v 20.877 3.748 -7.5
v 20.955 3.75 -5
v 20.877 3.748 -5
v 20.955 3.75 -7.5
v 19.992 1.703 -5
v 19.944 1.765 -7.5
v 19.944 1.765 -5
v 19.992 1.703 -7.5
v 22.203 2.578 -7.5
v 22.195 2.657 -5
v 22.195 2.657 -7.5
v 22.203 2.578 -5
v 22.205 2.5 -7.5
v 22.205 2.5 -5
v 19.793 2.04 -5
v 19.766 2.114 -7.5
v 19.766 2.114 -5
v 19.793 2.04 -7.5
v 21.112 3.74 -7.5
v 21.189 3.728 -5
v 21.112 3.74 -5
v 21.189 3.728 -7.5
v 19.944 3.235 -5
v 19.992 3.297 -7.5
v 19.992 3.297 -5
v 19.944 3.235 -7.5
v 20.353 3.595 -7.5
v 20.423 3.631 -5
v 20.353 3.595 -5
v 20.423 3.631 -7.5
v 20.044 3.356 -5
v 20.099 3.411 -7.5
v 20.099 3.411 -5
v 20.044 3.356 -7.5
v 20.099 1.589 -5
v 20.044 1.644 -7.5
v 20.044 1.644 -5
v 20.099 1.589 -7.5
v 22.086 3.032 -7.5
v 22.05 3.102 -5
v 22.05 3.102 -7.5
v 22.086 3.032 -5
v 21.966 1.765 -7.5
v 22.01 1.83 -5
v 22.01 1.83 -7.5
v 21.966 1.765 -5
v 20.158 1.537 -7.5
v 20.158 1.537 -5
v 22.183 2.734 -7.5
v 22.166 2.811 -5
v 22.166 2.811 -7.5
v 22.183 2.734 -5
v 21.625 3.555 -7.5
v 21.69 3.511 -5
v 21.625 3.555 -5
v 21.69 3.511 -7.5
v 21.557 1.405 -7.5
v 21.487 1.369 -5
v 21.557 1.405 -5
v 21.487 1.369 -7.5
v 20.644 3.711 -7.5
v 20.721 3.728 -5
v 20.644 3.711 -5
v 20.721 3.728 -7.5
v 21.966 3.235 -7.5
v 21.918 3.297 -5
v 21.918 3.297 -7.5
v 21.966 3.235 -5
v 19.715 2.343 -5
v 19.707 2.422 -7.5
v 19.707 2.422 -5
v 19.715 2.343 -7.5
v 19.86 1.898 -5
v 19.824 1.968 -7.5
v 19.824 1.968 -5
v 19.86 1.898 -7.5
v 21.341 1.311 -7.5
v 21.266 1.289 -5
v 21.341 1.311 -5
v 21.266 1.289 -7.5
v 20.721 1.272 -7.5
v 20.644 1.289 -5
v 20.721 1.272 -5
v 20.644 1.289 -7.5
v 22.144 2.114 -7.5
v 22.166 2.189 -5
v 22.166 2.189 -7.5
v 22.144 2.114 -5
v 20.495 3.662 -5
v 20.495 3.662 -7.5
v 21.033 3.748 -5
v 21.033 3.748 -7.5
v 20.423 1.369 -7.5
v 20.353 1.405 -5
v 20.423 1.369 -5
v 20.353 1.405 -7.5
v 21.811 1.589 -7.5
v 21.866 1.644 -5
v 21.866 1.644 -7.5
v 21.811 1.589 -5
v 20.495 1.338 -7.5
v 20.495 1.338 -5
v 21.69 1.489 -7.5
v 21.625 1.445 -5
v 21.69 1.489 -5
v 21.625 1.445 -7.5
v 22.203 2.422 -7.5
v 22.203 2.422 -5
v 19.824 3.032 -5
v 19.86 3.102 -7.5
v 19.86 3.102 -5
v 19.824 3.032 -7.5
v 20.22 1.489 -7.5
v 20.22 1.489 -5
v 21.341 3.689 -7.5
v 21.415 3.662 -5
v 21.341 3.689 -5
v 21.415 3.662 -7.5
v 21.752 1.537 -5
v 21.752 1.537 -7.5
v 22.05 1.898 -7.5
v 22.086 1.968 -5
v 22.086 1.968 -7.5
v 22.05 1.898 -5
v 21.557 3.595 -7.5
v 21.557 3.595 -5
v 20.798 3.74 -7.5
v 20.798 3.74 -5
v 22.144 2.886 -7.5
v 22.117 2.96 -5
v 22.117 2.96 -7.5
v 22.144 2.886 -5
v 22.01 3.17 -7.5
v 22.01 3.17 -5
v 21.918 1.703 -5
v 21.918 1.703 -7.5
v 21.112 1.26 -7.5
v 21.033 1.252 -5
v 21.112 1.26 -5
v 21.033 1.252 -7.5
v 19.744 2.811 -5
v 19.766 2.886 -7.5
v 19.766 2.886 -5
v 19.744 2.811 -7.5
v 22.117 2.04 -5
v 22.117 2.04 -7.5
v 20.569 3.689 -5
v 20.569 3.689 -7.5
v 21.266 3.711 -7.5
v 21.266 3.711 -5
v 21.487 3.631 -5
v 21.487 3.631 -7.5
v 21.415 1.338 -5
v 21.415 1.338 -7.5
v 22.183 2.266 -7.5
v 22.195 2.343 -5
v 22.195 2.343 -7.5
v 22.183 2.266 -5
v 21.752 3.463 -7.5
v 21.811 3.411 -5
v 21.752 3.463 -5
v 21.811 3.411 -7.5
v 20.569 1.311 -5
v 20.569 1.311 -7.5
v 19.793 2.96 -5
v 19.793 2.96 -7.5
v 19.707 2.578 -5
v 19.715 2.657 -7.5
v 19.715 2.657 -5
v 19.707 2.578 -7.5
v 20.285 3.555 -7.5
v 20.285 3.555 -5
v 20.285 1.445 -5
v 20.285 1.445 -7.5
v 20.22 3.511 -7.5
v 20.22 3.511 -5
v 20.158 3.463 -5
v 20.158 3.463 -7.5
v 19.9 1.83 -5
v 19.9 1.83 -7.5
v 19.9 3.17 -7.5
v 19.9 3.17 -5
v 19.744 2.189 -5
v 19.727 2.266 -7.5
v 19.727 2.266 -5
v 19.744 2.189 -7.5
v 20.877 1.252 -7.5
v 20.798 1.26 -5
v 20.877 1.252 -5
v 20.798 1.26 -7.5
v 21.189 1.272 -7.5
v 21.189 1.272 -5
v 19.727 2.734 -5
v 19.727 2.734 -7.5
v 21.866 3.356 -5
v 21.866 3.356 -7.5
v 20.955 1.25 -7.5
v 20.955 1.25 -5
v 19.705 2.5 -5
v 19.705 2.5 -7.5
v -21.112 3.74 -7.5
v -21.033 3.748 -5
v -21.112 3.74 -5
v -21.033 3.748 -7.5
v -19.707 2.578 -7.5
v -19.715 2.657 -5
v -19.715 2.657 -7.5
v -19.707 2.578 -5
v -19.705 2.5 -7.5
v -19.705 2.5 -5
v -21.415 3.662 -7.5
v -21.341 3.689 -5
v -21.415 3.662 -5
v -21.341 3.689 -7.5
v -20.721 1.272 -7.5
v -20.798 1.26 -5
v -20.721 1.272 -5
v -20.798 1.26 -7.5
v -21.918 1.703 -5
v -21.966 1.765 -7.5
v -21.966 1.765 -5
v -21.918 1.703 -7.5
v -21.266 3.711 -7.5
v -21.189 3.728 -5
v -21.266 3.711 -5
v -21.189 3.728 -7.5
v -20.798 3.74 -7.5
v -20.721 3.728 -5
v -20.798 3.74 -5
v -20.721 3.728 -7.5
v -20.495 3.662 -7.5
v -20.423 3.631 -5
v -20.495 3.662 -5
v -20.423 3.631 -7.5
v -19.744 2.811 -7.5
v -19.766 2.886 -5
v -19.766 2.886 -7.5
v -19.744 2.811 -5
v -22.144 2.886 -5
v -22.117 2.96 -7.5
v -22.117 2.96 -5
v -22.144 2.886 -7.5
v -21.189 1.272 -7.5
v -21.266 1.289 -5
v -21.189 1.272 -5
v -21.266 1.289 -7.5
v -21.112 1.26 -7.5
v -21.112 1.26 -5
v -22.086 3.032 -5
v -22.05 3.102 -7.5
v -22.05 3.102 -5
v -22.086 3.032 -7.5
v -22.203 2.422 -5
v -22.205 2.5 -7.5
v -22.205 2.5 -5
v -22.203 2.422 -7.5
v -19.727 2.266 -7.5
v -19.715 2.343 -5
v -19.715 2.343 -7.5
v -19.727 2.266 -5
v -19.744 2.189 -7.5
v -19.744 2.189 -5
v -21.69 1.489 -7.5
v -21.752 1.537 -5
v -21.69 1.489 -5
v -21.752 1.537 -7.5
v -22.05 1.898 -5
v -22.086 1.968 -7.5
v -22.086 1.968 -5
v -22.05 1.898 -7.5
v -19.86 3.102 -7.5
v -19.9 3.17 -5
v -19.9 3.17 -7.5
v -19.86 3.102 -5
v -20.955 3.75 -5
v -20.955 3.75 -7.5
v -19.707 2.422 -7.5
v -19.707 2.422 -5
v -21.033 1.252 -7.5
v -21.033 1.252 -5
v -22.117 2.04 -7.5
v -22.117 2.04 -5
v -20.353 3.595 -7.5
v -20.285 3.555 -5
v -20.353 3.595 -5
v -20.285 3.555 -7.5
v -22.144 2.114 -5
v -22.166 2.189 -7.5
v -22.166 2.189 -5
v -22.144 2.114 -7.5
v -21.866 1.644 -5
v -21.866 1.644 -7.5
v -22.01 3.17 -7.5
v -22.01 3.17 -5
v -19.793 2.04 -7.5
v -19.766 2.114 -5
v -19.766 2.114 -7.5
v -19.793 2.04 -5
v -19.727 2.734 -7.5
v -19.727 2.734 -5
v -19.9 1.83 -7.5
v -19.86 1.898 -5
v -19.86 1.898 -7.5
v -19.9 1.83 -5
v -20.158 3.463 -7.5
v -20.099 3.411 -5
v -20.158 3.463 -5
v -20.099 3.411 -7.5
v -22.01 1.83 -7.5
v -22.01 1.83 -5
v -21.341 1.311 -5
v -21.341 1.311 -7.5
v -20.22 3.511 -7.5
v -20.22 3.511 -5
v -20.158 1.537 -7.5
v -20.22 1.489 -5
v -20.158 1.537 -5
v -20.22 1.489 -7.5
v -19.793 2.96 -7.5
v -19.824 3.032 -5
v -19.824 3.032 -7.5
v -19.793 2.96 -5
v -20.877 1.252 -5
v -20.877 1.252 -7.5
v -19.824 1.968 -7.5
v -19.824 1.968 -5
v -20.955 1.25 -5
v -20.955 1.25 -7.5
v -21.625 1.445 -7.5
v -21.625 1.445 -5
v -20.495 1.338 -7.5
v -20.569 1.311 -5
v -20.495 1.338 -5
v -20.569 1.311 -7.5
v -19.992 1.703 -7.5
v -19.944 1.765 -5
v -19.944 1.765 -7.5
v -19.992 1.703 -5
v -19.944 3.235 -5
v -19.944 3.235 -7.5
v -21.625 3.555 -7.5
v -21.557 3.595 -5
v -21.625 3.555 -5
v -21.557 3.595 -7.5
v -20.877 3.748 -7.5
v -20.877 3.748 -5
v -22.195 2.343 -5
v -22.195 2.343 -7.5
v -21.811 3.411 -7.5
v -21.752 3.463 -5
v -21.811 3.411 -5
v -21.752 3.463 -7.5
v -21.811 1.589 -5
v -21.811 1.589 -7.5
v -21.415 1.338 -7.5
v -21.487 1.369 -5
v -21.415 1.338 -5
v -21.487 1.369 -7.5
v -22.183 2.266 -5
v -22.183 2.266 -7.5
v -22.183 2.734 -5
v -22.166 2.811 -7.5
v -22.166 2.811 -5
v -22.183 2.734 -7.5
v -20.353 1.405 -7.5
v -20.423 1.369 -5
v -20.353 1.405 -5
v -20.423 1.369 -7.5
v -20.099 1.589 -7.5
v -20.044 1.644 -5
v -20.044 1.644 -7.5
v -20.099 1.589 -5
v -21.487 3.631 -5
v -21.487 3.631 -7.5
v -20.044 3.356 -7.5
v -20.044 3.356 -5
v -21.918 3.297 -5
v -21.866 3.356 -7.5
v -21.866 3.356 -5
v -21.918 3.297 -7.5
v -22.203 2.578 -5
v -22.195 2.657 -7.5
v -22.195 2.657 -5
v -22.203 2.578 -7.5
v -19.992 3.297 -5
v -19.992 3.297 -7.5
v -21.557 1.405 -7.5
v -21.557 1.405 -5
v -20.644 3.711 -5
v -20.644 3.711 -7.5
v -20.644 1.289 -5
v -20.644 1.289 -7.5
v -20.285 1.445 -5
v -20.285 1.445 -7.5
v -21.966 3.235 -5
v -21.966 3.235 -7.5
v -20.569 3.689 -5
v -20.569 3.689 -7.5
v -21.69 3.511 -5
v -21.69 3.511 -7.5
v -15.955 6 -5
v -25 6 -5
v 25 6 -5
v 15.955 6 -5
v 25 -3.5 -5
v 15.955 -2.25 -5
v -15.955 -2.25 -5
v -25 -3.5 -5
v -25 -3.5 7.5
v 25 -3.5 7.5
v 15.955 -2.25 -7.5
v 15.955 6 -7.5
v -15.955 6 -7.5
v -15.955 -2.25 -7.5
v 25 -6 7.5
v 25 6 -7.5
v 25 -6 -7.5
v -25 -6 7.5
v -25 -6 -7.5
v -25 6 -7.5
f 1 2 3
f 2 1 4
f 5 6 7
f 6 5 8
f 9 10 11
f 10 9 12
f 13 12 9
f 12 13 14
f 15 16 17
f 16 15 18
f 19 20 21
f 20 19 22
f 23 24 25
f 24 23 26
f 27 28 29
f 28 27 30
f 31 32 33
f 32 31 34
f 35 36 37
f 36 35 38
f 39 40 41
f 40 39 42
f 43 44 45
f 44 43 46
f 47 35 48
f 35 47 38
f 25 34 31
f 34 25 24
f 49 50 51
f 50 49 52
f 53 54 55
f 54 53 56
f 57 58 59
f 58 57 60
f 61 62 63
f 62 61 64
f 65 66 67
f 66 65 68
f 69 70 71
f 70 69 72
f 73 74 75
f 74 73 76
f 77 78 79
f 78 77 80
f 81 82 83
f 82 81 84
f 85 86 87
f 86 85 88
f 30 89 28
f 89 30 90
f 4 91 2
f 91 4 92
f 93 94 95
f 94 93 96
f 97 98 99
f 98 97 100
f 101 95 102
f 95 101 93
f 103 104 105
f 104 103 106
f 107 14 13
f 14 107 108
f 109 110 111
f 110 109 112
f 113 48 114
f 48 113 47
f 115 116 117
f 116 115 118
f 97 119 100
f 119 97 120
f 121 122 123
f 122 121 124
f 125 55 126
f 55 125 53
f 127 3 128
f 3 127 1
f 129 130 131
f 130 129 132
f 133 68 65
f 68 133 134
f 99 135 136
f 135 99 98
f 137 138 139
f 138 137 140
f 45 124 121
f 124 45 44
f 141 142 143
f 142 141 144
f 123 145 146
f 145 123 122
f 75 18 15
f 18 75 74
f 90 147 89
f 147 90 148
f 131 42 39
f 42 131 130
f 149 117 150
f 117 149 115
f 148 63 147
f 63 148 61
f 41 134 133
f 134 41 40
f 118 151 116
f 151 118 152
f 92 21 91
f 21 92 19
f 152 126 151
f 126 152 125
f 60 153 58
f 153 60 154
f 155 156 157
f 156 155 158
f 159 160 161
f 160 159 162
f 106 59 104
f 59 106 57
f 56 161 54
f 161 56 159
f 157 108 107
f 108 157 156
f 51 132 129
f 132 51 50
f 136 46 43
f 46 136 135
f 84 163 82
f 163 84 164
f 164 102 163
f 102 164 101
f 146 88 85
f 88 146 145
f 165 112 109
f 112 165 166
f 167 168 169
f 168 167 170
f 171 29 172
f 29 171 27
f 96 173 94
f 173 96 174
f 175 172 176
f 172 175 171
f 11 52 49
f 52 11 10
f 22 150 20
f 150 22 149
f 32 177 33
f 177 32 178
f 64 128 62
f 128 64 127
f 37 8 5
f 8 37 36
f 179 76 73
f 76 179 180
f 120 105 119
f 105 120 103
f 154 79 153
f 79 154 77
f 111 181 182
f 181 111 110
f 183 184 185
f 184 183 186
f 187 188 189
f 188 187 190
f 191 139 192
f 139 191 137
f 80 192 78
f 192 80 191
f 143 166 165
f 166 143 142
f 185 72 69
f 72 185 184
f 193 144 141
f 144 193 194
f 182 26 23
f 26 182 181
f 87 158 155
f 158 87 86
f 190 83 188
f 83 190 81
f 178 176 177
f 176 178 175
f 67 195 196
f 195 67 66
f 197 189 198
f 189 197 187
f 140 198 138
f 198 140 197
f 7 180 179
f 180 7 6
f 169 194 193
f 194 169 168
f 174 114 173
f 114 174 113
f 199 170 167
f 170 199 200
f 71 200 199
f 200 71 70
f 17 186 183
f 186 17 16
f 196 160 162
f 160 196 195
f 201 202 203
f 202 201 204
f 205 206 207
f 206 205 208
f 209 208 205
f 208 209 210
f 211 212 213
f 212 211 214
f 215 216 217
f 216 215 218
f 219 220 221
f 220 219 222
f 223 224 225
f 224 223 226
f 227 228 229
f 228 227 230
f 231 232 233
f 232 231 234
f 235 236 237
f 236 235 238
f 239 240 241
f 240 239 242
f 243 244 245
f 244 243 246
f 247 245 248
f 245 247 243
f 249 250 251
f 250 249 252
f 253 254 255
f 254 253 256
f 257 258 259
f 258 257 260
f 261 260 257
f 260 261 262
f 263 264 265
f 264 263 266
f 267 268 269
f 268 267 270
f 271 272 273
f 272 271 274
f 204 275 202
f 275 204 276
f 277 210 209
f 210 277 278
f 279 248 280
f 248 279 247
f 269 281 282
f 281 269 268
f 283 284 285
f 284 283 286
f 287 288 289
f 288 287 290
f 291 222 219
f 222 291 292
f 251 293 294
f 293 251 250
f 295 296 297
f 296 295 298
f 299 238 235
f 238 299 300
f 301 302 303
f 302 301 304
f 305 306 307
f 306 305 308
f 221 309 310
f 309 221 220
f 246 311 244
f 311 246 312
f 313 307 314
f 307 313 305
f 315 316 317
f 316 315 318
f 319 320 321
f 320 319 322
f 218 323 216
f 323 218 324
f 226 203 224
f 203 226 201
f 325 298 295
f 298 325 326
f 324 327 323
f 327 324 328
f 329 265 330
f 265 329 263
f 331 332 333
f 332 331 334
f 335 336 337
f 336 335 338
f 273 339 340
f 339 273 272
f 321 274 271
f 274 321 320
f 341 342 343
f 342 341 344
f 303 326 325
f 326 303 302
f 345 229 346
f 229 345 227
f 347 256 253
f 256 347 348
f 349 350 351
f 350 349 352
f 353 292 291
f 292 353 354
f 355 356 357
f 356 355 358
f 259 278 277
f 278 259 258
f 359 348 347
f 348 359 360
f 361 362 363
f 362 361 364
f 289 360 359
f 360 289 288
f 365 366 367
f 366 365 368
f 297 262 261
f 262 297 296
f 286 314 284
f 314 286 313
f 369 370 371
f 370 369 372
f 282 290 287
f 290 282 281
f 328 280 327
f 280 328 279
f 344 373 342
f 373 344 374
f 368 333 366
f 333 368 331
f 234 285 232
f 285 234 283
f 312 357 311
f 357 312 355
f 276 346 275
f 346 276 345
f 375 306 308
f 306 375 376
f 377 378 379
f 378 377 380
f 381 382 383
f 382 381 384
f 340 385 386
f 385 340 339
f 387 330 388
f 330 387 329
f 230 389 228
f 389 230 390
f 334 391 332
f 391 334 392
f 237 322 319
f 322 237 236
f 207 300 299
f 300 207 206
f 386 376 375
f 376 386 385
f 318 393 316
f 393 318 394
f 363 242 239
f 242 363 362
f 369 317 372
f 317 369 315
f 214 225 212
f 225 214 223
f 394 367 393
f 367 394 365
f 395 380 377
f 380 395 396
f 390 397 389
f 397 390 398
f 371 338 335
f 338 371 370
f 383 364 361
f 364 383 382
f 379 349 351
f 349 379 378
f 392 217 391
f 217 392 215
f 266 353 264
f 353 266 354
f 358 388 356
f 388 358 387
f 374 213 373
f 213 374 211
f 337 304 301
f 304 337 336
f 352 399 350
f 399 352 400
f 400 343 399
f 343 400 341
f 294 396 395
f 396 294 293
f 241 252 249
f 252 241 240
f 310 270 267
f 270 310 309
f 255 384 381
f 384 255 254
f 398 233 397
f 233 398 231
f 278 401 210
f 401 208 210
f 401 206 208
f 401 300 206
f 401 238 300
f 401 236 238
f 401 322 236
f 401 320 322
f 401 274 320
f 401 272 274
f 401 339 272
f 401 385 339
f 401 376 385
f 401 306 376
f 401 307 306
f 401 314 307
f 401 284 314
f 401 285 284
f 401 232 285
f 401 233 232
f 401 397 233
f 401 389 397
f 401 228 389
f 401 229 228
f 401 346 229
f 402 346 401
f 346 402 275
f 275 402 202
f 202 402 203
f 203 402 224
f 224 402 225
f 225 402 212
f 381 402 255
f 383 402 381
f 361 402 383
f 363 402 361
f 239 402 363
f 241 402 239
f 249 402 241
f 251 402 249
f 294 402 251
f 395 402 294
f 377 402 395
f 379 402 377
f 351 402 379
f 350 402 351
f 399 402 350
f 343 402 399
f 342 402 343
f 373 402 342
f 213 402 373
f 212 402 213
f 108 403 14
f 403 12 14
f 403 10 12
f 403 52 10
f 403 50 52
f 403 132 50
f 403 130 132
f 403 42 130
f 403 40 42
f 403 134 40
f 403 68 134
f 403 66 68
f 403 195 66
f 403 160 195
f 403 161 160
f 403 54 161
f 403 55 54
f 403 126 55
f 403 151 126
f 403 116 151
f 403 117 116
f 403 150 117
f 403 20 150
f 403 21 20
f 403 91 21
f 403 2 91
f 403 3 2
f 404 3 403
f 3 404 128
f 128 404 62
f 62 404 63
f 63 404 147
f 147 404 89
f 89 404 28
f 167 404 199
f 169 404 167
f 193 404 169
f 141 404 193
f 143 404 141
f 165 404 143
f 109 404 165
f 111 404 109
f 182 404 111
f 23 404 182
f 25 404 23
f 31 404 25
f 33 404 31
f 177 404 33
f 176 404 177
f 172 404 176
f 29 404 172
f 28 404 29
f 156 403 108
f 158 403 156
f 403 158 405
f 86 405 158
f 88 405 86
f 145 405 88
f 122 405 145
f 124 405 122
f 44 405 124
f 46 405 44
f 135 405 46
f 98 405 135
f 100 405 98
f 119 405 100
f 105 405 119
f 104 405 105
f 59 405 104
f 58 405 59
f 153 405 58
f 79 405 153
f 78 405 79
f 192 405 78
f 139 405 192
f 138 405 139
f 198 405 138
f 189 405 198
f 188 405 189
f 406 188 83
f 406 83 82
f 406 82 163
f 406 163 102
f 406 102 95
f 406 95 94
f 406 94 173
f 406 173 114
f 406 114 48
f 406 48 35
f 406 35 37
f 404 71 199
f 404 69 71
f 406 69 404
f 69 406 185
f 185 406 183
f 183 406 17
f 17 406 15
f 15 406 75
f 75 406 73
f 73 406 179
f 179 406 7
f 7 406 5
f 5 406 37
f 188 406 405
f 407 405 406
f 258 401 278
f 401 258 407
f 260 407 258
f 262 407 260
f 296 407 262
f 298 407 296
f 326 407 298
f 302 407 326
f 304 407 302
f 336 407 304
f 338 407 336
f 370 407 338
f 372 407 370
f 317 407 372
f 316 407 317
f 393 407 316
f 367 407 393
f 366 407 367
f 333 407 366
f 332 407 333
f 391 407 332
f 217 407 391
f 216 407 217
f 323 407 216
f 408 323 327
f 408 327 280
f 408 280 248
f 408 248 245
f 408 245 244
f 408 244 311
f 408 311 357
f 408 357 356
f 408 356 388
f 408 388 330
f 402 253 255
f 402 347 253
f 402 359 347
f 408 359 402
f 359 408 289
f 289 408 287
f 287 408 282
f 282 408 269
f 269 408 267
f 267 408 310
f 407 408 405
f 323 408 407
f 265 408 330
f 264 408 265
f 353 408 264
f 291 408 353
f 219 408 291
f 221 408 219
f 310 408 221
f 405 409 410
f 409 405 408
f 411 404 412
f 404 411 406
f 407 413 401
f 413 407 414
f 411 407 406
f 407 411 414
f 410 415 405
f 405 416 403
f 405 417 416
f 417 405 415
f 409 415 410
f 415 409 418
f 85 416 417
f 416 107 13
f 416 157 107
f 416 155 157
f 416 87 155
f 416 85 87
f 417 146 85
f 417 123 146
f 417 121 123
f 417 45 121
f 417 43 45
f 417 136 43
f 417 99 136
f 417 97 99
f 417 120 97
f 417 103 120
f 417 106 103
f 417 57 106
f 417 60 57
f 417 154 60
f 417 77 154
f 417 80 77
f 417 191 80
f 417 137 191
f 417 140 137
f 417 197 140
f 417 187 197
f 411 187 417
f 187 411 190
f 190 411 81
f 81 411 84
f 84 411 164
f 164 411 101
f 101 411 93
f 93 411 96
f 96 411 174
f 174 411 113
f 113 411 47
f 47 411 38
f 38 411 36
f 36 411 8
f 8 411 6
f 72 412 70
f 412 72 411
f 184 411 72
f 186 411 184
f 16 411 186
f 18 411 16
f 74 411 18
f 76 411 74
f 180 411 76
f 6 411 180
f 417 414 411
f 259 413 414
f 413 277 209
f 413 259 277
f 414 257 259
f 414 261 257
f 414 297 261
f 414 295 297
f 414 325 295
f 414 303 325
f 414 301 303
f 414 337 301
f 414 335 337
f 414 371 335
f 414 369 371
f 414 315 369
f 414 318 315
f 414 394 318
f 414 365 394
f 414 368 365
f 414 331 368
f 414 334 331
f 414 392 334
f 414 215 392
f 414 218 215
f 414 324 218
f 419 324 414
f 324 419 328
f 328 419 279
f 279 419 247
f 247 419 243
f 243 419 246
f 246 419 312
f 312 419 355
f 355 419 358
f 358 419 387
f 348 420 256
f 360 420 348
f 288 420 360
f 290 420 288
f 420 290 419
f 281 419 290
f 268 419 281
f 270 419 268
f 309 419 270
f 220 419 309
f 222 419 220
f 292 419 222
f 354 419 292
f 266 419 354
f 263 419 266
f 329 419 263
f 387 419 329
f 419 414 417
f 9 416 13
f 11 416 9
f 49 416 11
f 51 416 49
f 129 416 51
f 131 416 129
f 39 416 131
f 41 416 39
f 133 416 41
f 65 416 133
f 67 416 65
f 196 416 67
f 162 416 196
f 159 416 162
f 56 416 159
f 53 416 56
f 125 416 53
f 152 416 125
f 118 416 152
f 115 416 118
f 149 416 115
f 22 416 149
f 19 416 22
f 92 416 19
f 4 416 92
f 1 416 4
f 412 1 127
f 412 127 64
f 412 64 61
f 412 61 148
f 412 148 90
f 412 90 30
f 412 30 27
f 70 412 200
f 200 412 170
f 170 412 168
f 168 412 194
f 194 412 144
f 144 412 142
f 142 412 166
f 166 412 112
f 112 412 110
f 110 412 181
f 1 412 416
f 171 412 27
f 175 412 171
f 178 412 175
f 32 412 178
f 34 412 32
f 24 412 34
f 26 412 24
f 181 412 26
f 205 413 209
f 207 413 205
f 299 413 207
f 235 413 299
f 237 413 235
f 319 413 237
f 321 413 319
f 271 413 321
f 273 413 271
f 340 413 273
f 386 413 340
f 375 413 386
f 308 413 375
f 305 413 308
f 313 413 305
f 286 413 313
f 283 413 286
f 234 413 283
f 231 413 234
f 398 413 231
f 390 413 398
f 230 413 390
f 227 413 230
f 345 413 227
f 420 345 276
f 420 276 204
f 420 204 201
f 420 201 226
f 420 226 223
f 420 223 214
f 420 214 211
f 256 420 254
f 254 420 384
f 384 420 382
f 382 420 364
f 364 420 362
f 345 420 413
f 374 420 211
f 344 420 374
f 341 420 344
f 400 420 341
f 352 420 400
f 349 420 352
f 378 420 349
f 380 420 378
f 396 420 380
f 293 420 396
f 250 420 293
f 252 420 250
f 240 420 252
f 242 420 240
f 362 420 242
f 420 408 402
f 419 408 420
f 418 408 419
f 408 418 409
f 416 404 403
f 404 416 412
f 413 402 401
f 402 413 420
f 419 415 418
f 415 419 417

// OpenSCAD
// Holder for SparkFun Lumenati 8 lamp stick

$fn=100;

// All dimensions in mm

ClipLength = 50;
Height = 12;
Depth = 15;
SlotWidth = 30;
Thickness = 2.5;

AccHoleSpace = 10; // from Plainbase.scad
HoleDia = 2.5; 

LampHoleSpace = (1.65 * 25.4);  // 1.465 in

module Box()
{
  union() {
    cube([ClipLength, Height, Depth], center=true);
  }
}

module LampHoles() {
  union() {
    translate([0.5 * LampHoleSpace, 2.5, 0])
       cylinder(d = HoleDia, h = 20, center=true);
    translate([-0.5 * LampHoleSpace, 2.5, 0])
       cylinder(d = HoleDia, h = 20, center=true);
  }
}

module Cutout()
{
  union() {
    translate([0, Thickness, Thickness]) cube([ClipLength + 10, Height, Depth], center=true);
    translate([0, Thickness*1.5, -Thickness]) cube([LampHoleSpace - 10, Height, Depth], center=true);
  }
}


difference() {
  Box();
  union() {
    LampHoles();
    Cutout();
  }
}
